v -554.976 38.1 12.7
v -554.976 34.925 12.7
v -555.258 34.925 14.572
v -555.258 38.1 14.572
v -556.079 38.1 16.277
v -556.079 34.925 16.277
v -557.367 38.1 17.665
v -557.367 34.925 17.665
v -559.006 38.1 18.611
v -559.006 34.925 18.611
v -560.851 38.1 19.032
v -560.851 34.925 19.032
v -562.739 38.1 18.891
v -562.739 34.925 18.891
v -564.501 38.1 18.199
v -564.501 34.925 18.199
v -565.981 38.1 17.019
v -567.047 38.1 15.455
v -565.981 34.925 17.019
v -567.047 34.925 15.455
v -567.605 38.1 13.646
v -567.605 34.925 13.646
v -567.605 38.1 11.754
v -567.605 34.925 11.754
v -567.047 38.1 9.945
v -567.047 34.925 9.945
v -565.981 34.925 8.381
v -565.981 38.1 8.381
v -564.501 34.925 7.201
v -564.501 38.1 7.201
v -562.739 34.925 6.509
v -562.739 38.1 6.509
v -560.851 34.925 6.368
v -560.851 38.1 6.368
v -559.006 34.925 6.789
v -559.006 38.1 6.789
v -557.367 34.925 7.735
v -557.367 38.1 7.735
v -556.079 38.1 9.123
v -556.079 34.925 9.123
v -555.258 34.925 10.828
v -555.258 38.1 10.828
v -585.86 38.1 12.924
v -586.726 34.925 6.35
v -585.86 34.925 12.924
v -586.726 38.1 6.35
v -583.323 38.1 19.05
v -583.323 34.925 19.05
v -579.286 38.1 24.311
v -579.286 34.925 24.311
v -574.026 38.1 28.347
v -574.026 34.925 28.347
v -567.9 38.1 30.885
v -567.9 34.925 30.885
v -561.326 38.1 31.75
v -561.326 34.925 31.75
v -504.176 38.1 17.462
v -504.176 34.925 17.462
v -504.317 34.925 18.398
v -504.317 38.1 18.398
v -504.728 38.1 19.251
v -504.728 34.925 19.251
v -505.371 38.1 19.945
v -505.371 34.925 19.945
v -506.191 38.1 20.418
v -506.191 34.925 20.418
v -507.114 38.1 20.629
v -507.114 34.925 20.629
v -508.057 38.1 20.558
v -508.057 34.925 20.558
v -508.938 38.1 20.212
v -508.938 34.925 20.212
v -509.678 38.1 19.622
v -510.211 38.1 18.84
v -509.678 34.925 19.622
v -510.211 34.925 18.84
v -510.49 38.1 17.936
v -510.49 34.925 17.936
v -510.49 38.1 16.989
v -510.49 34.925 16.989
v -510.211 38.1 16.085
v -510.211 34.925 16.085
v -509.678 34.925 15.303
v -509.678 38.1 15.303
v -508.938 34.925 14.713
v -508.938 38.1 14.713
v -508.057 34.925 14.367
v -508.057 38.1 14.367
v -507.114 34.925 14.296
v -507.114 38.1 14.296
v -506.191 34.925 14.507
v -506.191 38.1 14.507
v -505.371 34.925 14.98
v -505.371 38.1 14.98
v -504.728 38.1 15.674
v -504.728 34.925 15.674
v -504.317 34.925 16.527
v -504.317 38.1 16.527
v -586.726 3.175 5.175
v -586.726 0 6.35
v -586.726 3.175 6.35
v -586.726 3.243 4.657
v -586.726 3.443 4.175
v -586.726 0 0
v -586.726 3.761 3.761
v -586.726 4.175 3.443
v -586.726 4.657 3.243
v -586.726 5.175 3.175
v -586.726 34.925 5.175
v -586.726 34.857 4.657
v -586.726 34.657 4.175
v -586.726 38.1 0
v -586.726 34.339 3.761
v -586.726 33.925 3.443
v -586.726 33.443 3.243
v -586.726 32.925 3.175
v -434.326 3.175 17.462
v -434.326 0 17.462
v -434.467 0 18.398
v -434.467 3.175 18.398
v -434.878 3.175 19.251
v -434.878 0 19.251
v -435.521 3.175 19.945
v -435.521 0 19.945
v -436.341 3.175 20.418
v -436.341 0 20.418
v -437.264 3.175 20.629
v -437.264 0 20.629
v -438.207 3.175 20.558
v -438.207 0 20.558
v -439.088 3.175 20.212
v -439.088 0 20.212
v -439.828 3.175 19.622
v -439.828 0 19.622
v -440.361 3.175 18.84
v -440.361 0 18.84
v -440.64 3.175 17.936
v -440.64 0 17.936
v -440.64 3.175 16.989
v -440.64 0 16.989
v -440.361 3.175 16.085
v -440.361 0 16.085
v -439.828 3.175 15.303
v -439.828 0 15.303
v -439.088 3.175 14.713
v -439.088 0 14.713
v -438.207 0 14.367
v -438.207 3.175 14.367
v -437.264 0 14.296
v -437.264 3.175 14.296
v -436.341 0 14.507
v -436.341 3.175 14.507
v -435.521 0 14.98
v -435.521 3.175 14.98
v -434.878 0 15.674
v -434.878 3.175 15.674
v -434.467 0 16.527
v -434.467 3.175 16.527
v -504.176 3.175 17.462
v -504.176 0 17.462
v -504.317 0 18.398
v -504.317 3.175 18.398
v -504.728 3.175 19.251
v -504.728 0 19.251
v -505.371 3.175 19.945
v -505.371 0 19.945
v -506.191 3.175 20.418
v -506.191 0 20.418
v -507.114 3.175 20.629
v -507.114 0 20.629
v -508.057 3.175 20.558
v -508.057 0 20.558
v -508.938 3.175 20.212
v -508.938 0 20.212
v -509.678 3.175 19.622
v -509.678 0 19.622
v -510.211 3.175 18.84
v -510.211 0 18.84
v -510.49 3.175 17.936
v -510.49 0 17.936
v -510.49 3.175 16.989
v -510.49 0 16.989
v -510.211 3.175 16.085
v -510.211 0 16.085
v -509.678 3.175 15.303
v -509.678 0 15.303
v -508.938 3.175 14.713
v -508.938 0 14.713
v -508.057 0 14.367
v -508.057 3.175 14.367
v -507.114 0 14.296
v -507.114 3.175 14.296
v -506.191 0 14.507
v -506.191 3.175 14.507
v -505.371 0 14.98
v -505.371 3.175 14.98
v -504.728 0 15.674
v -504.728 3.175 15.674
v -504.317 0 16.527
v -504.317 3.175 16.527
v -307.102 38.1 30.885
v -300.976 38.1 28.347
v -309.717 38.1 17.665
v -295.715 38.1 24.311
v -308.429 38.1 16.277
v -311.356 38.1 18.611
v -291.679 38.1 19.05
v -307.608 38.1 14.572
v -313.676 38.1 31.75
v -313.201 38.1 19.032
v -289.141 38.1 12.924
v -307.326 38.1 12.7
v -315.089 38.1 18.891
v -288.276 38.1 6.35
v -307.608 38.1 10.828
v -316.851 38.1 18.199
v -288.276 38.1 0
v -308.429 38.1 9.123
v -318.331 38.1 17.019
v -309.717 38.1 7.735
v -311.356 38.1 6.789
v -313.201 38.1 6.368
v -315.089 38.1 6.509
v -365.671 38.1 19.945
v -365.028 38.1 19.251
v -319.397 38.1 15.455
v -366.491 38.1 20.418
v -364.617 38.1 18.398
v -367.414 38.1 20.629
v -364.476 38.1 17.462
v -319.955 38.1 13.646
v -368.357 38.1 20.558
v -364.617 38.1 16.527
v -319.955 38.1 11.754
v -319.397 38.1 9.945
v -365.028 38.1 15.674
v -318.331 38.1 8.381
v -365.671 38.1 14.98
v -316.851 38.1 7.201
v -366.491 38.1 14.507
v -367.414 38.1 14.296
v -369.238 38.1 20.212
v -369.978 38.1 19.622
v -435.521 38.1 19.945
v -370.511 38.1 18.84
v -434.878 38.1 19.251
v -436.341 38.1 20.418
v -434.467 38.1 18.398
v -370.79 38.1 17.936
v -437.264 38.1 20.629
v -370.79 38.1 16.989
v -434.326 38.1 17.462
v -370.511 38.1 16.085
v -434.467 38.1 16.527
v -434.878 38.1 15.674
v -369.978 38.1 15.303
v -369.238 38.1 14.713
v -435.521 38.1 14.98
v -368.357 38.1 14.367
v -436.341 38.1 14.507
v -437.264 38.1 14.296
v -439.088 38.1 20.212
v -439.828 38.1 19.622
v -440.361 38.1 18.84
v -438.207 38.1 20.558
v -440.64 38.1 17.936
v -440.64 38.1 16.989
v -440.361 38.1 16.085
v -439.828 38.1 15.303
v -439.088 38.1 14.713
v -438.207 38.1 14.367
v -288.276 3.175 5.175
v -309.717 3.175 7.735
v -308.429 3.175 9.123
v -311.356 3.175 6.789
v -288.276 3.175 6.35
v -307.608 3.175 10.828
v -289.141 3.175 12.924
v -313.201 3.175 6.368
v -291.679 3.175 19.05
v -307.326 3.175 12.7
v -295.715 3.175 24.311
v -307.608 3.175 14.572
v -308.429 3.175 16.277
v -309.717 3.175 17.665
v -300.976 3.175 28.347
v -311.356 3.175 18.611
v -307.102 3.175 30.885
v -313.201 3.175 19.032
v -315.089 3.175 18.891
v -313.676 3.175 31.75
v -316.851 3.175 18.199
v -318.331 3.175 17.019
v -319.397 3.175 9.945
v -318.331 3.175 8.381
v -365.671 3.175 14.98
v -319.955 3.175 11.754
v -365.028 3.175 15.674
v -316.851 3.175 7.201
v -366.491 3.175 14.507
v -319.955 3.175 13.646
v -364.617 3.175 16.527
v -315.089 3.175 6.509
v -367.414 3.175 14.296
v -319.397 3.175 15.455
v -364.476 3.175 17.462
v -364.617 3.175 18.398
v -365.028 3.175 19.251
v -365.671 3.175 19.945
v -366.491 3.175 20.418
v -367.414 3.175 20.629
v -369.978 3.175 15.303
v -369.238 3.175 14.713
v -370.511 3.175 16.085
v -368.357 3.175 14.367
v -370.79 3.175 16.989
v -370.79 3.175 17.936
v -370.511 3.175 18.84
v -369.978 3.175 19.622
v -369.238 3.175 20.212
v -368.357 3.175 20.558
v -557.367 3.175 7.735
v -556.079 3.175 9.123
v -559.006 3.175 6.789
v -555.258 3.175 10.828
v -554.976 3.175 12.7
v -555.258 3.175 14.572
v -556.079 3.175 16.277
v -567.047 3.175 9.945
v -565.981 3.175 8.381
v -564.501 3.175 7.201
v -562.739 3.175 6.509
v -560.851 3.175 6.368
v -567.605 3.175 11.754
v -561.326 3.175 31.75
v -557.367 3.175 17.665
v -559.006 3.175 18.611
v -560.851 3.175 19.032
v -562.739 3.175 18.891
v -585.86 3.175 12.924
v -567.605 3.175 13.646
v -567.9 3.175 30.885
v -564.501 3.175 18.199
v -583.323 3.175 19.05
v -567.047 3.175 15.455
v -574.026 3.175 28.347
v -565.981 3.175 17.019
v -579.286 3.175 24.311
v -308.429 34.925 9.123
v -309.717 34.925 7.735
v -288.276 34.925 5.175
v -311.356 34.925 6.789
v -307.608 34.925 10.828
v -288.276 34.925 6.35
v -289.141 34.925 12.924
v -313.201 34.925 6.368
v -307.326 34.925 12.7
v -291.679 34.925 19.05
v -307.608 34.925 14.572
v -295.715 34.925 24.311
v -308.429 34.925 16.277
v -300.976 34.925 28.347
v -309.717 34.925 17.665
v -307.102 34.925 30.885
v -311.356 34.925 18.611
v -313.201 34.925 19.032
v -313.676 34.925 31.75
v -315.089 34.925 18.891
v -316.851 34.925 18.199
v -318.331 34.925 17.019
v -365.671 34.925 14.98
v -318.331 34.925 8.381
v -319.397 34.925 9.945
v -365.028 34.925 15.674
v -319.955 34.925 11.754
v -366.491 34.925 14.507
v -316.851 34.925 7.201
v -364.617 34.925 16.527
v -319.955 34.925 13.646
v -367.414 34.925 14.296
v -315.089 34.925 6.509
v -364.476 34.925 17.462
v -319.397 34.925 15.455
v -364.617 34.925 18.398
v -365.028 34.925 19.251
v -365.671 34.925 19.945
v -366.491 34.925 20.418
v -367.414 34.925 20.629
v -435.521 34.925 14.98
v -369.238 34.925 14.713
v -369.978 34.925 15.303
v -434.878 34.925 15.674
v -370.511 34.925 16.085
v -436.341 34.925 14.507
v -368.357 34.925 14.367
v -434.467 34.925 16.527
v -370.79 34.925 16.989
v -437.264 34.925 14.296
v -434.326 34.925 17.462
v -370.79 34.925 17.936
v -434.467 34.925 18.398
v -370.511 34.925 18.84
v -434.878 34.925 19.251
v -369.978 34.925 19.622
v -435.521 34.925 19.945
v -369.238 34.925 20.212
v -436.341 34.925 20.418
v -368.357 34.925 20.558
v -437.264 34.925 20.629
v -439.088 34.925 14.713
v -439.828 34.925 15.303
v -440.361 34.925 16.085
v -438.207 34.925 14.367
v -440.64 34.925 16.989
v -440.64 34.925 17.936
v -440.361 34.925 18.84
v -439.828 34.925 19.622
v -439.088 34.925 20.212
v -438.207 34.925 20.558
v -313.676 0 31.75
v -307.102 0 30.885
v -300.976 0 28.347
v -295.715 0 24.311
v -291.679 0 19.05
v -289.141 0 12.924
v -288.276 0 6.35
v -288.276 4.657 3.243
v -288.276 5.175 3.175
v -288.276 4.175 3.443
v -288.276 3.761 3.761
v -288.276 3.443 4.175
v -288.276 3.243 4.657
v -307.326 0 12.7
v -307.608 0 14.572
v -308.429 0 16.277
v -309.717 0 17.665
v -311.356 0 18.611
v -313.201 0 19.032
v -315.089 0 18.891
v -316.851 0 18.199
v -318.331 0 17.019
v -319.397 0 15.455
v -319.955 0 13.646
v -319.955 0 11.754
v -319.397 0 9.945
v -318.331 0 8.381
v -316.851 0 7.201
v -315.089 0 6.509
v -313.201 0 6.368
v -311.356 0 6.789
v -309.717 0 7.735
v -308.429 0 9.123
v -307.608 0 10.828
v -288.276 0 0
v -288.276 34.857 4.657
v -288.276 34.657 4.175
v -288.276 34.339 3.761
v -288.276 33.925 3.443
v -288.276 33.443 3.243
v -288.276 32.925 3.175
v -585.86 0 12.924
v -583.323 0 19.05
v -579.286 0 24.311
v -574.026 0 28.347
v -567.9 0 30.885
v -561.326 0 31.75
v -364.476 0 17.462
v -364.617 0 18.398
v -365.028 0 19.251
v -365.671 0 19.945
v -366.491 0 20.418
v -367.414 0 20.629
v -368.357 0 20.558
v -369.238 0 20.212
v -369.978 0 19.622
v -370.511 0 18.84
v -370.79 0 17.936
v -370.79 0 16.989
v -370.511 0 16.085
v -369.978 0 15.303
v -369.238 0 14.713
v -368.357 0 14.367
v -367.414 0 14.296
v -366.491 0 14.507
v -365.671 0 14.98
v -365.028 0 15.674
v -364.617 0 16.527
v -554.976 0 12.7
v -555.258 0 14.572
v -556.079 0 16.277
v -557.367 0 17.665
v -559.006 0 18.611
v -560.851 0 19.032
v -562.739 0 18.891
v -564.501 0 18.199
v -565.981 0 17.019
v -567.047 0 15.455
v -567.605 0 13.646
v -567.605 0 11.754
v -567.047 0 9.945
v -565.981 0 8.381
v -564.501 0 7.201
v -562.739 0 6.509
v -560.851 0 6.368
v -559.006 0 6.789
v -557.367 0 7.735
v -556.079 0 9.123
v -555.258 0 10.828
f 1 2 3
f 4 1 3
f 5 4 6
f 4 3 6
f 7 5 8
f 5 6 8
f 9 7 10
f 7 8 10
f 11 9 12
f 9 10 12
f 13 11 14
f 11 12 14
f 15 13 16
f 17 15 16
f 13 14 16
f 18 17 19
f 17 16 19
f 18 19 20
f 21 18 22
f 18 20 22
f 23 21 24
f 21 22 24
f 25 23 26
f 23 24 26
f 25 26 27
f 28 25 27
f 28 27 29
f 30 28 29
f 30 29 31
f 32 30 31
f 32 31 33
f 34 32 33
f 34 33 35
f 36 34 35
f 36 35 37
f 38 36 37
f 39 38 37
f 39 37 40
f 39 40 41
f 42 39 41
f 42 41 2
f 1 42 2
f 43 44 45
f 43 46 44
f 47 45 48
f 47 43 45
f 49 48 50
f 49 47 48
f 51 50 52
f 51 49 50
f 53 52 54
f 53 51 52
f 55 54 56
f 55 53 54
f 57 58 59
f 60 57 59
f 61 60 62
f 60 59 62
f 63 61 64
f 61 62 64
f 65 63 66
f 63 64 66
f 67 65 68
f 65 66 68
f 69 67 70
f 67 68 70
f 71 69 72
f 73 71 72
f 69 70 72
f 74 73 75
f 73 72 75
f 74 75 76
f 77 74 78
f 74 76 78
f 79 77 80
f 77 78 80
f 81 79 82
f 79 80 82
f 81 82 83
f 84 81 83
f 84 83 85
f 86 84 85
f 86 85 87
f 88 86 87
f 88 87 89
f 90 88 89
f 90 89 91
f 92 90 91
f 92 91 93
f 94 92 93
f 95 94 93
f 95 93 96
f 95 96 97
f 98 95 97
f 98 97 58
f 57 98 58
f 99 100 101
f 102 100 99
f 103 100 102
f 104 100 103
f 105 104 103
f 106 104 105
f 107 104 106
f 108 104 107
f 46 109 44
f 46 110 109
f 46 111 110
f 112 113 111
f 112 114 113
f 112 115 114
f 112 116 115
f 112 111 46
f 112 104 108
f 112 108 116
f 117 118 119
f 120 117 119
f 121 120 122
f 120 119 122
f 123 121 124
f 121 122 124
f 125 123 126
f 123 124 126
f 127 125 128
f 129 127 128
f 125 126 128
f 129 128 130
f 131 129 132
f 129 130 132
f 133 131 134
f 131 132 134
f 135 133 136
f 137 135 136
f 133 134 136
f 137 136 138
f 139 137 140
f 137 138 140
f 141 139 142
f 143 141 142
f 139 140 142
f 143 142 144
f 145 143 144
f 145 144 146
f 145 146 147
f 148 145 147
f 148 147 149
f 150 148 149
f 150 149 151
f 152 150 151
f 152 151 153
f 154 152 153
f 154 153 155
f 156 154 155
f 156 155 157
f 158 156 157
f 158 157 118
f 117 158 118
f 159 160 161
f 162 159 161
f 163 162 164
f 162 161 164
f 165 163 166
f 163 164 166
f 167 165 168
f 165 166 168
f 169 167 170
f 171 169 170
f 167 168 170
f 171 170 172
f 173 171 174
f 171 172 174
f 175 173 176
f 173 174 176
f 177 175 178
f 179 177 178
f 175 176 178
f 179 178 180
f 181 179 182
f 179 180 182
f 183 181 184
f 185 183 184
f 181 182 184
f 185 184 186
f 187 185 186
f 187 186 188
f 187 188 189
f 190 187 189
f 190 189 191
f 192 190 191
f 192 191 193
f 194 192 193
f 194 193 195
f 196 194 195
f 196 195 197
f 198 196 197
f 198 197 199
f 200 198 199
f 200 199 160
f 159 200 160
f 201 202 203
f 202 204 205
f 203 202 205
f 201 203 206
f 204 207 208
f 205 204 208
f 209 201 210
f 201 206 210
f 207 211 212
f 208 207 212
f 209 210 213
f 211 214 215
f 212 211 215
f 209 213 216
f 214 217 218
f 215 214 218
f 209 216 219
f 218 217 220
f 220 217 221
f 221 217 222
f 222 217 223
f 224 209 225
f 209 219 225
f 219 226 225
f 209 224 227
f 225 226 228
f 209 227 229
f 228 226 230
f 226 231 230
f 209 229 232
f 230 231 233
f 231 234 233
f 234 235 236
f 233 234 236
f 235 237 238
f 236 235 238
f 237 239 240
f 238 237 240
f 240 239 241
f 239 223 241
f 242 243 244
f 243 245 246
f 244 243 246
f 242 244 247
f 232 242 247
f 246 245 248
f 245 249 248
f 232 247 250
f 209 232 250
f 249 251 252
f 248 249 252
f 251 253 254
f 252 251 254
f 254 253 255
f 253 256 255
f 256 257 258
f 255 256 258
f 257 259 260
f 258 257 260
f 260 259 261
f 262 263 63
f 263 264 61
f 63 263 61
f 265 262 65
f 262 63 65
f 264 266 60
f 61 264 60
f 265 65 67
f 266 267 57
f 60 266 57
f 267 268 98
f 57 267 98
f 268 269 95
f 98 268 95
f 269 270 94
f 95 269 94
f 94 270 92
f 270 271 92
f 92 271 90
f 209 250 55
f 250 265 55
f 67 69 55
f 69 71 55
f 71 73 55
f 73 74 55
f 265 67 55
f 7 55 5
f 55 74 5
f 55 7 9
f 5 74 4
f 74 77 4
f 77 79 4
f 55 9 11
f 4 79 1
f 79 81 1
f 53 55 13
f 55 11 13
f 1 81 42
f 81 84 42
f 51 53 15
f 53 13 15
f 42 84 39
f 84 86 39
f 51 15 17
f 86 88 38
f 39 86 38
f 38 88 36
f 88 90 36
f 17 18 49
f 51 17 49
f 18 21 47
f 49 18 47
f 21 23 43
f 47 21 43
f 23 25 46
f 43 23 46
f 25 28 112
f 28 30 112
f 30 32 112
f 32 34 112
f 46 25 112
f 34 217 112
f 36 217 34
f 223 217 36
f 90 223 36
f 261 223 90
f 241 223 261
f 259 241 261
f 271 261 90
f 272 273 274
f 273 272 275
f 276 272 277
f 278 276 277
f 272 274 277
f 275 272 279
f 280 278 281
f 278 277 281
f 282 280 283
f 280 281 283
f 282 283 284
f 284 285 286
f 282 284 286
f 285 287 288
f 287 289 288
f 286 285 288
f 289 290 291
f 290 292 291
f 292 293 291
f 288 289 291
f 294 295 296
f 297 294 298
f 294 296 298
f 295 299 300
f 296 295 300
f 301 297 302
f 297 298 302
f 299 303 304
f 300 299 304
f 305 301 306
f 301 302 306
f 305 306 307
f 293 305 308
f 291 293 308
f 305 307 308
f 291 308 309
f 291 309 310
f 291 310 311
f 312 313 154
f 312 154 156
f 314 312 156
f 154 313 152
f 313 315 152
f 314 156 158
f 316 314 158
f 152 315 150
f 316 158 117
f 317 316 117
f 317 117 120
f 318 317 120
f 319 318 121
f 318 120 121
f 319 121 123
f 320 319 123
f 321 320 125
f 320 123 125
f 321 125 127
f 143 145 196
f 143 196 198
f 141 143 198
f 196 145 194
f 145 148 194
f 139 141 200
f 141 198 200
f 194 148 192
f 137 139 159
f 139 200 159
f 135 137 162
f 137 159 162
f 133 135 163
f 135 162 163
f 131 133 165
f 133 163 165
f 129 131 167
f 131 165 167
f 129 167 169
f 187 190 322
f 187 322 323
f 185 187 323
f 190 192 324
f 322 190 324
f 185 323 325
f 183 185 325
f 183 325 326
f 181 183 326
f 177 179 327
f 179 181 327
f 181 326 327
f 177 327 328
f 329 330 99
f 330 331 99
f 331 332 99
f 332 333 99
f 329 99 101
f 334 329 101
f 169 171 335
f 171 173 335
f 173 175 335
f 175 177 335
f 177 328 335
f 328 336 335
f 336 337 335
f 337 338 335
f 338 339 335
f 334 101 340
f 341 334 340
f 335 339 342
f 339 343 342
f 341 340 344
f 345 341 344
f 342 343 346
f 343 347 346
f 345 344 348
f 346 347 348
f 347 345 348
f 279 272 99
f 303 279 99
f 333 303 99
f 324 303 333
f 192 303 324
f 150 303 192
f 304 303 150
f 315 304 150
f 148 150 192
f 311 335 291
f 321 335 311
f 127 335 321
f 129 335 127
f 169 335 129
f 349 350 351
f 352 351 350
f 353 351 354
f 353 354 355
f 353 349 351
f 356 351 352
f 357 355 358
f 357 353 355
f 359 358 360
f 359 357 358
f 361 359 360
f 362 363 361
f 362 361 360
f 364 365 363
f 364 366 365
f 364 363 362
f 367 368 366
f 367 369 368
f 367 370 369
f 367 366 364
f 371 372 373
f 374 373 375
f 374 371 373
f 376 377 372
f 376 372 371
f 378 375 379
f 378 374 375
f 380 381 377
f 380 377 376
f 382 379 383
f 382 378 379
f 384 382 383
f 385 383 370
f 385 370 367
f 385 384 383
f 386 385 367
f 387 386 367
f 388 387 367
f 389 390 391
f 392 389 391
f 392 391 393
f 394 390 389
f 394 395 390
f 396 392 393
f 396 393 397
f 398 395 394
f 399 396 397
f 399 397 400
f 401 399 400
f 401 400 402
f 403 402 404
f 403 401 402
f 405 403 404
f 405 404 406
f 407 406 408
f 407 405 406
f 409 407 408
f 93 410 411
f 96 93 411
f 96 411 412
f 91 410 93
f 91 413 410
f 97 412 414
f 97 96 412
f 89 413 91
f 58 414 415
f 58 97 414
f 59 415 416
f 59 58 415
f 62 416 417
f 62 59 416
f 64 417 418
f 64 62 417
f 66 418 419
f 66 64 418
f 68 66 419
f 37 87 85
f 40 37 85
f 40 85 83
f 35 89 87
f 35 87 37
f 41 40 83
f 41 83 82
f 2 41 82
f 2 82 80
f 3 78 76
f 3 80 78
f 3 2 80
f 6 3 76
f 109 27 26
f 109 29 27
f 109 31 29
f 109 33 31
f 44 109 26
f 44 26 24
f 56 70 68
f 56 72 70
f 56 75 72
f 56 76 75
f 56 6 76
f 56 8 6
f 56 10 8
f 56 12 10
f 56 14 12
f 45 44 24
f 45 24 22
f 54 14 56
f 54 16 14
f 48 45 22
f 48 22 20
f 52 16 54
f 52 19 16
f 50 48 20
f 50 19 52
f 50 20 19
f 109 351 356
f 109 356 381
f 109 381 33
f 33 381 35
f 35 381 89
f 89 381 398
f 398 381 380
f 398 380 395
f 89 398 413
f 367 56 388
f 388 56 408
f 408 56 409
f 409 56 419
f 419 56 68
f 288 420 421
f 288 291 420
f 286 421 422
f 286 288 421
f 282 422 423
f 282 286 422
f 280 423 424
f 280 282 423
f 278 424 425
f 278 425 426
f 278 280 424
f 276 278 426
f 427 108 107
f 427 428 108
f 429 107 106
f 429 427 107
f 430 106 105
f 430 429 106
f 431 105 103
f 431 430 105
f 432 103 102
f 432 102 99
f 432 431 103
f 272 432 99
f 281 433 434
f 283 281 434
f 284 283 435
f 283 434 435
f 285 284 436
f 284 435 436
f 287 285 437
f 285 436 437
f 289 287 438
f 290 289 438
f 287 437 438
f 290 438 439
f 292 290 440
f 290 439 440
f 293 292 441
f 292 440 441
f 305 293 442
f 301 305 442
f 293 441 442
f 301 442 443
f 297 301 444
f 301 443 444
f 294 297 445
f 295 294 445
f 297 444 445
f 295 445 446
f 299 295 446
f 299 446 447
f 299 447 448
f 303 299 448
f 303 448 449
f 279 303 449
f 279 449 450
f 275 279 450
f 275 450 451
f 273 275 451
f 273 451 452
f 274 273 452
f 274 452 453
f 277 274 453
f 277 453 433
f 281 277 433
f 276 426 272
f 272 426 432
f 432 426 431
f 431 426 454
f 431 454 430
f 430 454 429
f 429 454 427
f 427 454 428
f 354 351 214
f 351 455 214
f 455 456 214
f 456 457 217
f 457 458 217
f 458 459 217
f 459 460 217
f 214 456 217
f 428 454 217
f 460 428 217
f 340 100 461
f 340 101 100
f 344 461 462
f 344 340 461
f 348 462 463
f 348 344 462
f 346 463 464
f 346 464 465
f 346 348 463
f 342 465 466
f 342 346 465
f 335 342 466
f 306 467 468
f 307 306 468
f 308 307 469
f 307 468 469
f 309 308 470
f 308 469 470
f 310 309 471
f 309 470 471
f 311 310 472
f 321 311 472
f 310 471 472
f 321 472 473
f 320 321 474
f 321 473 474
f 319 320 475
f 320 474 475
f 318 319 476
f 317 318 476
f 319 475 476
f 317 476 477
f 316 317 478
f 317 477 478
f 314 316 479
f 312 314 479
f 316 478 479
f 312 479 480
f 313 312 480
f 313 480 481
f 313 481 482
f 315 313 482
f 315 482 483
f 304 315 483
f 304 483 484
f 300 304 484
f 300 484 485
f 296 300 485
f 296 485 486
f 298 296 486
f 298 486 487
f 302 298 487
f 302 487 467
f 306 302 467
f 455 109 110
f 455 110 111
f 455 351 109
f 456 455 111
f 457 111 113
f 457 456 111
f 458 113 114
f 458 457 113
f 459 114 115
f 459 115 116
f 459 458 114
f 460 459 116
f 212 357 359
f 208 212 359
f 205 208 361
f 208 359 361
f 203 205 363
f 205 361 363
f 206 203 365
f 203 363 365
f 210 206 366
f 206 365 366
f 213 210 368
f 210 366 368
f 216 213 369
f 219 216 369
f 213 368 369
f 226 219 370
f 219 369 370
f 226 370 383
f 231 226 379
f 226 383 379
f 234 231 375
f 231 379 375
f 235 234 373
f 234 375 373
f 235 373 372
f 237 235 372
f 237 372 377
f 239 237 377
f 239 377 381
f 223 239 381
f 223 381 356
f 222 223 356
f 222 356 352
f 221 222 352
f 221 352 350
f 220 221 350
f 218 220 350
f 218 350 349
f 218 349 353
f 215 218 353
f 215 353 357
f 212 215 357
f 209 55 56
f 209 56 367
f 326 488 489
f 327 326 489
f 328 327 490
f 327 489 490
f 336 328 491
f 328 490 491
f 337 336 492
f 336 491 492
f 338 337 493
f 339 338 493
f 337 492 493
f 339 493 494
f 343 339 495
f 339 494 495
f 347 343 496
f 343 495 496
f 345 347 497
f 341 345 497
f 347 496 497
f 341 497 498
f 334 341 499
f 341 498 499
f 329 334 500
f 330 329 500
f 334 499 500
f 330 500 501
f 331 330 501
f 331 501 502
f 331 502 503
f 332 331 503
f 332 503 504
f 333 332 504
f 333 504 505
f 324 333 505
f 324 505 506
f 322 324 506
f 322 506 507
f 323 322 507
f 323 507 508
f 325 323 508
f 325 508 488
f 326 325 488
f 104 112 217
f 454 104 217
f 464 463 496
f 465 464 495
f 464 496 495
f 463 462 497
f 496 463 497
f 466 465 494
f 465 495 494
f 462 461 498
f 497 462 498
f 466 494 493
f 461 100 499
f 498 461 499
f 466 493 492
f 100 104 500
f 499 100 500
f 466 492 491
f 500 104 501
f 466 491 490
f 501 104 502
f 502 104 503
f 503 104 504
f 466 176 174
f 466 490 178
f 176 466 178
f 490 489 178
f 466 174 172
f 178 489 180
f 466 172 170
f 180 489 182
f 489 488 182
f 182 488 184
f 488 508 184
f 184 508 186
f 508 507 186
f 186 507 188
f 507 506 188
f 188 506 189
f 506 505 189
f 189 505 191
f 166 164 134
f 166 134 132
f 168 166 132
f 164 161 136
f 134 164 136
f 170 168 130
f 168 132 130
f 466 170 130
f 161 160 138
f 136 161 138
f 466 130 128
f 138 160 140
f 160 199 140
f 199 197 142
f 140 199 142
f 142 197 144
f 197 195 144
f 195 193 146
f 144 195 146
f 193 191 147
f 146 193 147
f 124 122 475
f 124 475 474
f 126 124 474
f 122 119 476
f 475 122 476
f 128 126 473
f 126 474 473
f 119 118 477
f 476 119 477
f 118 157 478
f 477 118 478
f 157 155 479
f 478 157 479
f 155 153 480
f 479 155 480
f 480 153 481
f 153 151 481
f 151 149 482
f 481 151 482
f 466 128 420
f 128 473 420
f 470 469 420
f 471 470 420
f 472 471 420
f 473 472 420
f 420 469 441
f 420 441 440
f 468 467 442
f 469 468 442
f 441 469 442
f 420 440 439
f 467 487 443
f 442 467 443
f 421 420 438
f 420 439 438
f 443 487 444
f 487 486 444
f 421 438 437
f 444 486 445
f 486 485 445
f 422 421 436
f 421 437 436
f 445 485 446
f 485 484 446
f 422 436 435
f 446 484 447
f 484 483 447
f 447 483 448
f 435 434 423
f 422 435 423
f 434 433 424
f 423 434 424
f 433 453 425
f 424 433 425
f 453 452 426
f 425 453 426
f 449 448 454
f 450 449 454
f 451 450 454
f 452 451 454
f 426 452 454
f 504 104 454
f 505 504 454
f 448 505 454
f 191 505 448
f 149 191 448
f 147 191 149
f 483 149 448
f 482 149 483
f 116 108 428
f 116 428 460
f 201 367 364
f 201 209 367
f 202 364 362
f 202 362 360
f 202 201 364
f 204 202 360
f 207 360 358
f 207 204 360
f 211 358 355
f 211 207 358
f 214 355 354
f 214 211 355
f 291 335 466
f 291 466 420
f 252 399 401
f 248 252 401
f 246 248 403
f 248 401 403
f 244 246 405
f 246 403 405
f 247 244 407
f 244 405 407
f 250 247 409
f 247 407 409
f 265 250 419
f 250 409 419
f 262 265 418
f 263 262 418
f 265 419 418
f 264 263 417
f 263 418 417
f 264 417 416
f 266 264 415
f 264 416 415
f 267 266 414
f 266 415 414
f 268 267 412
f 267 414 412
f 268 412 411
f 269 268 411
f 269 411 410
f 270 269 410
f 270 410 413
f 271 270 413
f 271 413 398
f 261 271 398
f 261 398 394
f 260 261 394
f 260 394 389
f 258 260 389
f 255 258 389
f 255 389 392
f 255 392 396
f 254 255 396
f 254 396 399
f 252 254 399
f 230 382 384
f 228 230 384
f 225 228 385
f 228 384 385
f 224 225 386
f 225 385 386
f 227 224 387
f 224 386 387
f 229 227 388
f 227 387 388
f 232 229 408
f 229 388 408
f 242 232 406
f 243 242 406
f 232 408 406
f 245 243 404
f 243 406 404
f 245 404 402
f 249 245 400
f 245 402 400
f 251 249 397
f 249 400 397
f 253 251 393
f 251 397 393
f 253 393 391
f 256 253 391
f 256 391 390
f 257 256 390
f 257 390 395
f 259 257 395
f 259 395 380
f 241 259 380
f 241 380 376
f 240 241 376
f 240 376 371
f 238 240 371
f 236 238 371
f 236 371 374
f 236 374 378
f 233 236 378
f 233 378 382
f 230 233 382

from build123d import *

# Parameters (mm, degrees)
SKETCH1_W           = 50.8
SKETCH1_H           = 38.1
SKETCH1_W_2         = 196.85
BOSS_EXTRUDE1_DEPTH = 31.75
SKETCH2_W           = 28.575
SKETCH2_H           = 31.75
CUT_EXTRUDE1_DEPTH  = 299.45
SKETCH3_R           = 6.35
CUT_EXTRUDE2_DEPTH  = 39.1
FILLET1_R           = 25.4
SKETCH4_R           = 3.175
CUT_EXTRUDE3_DEPTH  = 39.1
FILLET2_R           = 2


with BuildPart() as part:
    # Sketch1 → Boss-Extrude1 (new body)
    with BuildSketch(Plane.XY):
        with Locations((-561.325887252, 19.05)):
            Rectangle(SKETCH1_W, SKETCH1_H)
        with Locations((-437.500887252, 19.05)):
            Rectangle(SKETCH1_W_2, SKETCH1_H)
        with Locations((-313.675887252, 19.05)):
            Rectangle(SKETCH1_W, SKETCH1_H)
    extrude(amount=BOSS_EXTRUDE1_DEPTH)

    # Sketch2 → Cut-Extrude1 (cut, through all)
    with BuildSketch(Plane.ZY.offset(586.725887252)):
        with Locations((17.4625, 19.05)):
            Rectangle(SKETCH2_W, SKETCH2_H)
    extrude(amount=-CUT_EXTRUDE1_DEPTH, mode=Mode.SUBTRACT)

    # Sketch3 → Cut-Extrude2 (cut, through all)
    with BuildSketch(Plane.XZ):
        with Locations((-561.325887252, 12.7)):
            Circle(SKETCH3_R)
        with Locations((-313.675887252, 12.7)):
            Circle(SKETCH3_R)
    extrude(amount=-CUT_EXTRUDE2_DEPTH, mode=Mode.SUBTRACT)

    # Fillet1
    fillet1_edges = [part.edges().sort_by_distance(p)[0] for p in [
        (-586.725887252, 36.5125, 31.75),
        (-288.275887252, 1.5875, 31.75),
        (-288.275887252, 36.5125, 31.75),
        (-586.725887252, 1.5875, 31.75),
    ]]
    fillet(fillet1_edges, radius=FILLET1_R)

    # Sketch4 → Cut-Extrude3 (cut, through all)
    with BuildSketch(Plane.XZ):
        with Locations((-507.350887252, 17.4625)):
            Circle(SKETCH4_R)
        with Locations((-437.500887252, 17.4625)):
            Circle(SKETCH4_R)
        with Locations((-367.650887252, 17.4625)):
            Circle(SKETCH4_R)
    extrude(amount=-CUT_EXTRUDE3_DEPTH, mode=Mode.SUBTRACT)

    # Fillet2
    fillet2_edges = [part.edges().sort_by_distance(p)[0] for p in [
        (-437.500887252, 3.175, 3.175),
        (-437.500887252, 34.925, 3.175),
    ]]
    fillet(fillet2_edges, radius=FILLET2_R)


solid = part.part
